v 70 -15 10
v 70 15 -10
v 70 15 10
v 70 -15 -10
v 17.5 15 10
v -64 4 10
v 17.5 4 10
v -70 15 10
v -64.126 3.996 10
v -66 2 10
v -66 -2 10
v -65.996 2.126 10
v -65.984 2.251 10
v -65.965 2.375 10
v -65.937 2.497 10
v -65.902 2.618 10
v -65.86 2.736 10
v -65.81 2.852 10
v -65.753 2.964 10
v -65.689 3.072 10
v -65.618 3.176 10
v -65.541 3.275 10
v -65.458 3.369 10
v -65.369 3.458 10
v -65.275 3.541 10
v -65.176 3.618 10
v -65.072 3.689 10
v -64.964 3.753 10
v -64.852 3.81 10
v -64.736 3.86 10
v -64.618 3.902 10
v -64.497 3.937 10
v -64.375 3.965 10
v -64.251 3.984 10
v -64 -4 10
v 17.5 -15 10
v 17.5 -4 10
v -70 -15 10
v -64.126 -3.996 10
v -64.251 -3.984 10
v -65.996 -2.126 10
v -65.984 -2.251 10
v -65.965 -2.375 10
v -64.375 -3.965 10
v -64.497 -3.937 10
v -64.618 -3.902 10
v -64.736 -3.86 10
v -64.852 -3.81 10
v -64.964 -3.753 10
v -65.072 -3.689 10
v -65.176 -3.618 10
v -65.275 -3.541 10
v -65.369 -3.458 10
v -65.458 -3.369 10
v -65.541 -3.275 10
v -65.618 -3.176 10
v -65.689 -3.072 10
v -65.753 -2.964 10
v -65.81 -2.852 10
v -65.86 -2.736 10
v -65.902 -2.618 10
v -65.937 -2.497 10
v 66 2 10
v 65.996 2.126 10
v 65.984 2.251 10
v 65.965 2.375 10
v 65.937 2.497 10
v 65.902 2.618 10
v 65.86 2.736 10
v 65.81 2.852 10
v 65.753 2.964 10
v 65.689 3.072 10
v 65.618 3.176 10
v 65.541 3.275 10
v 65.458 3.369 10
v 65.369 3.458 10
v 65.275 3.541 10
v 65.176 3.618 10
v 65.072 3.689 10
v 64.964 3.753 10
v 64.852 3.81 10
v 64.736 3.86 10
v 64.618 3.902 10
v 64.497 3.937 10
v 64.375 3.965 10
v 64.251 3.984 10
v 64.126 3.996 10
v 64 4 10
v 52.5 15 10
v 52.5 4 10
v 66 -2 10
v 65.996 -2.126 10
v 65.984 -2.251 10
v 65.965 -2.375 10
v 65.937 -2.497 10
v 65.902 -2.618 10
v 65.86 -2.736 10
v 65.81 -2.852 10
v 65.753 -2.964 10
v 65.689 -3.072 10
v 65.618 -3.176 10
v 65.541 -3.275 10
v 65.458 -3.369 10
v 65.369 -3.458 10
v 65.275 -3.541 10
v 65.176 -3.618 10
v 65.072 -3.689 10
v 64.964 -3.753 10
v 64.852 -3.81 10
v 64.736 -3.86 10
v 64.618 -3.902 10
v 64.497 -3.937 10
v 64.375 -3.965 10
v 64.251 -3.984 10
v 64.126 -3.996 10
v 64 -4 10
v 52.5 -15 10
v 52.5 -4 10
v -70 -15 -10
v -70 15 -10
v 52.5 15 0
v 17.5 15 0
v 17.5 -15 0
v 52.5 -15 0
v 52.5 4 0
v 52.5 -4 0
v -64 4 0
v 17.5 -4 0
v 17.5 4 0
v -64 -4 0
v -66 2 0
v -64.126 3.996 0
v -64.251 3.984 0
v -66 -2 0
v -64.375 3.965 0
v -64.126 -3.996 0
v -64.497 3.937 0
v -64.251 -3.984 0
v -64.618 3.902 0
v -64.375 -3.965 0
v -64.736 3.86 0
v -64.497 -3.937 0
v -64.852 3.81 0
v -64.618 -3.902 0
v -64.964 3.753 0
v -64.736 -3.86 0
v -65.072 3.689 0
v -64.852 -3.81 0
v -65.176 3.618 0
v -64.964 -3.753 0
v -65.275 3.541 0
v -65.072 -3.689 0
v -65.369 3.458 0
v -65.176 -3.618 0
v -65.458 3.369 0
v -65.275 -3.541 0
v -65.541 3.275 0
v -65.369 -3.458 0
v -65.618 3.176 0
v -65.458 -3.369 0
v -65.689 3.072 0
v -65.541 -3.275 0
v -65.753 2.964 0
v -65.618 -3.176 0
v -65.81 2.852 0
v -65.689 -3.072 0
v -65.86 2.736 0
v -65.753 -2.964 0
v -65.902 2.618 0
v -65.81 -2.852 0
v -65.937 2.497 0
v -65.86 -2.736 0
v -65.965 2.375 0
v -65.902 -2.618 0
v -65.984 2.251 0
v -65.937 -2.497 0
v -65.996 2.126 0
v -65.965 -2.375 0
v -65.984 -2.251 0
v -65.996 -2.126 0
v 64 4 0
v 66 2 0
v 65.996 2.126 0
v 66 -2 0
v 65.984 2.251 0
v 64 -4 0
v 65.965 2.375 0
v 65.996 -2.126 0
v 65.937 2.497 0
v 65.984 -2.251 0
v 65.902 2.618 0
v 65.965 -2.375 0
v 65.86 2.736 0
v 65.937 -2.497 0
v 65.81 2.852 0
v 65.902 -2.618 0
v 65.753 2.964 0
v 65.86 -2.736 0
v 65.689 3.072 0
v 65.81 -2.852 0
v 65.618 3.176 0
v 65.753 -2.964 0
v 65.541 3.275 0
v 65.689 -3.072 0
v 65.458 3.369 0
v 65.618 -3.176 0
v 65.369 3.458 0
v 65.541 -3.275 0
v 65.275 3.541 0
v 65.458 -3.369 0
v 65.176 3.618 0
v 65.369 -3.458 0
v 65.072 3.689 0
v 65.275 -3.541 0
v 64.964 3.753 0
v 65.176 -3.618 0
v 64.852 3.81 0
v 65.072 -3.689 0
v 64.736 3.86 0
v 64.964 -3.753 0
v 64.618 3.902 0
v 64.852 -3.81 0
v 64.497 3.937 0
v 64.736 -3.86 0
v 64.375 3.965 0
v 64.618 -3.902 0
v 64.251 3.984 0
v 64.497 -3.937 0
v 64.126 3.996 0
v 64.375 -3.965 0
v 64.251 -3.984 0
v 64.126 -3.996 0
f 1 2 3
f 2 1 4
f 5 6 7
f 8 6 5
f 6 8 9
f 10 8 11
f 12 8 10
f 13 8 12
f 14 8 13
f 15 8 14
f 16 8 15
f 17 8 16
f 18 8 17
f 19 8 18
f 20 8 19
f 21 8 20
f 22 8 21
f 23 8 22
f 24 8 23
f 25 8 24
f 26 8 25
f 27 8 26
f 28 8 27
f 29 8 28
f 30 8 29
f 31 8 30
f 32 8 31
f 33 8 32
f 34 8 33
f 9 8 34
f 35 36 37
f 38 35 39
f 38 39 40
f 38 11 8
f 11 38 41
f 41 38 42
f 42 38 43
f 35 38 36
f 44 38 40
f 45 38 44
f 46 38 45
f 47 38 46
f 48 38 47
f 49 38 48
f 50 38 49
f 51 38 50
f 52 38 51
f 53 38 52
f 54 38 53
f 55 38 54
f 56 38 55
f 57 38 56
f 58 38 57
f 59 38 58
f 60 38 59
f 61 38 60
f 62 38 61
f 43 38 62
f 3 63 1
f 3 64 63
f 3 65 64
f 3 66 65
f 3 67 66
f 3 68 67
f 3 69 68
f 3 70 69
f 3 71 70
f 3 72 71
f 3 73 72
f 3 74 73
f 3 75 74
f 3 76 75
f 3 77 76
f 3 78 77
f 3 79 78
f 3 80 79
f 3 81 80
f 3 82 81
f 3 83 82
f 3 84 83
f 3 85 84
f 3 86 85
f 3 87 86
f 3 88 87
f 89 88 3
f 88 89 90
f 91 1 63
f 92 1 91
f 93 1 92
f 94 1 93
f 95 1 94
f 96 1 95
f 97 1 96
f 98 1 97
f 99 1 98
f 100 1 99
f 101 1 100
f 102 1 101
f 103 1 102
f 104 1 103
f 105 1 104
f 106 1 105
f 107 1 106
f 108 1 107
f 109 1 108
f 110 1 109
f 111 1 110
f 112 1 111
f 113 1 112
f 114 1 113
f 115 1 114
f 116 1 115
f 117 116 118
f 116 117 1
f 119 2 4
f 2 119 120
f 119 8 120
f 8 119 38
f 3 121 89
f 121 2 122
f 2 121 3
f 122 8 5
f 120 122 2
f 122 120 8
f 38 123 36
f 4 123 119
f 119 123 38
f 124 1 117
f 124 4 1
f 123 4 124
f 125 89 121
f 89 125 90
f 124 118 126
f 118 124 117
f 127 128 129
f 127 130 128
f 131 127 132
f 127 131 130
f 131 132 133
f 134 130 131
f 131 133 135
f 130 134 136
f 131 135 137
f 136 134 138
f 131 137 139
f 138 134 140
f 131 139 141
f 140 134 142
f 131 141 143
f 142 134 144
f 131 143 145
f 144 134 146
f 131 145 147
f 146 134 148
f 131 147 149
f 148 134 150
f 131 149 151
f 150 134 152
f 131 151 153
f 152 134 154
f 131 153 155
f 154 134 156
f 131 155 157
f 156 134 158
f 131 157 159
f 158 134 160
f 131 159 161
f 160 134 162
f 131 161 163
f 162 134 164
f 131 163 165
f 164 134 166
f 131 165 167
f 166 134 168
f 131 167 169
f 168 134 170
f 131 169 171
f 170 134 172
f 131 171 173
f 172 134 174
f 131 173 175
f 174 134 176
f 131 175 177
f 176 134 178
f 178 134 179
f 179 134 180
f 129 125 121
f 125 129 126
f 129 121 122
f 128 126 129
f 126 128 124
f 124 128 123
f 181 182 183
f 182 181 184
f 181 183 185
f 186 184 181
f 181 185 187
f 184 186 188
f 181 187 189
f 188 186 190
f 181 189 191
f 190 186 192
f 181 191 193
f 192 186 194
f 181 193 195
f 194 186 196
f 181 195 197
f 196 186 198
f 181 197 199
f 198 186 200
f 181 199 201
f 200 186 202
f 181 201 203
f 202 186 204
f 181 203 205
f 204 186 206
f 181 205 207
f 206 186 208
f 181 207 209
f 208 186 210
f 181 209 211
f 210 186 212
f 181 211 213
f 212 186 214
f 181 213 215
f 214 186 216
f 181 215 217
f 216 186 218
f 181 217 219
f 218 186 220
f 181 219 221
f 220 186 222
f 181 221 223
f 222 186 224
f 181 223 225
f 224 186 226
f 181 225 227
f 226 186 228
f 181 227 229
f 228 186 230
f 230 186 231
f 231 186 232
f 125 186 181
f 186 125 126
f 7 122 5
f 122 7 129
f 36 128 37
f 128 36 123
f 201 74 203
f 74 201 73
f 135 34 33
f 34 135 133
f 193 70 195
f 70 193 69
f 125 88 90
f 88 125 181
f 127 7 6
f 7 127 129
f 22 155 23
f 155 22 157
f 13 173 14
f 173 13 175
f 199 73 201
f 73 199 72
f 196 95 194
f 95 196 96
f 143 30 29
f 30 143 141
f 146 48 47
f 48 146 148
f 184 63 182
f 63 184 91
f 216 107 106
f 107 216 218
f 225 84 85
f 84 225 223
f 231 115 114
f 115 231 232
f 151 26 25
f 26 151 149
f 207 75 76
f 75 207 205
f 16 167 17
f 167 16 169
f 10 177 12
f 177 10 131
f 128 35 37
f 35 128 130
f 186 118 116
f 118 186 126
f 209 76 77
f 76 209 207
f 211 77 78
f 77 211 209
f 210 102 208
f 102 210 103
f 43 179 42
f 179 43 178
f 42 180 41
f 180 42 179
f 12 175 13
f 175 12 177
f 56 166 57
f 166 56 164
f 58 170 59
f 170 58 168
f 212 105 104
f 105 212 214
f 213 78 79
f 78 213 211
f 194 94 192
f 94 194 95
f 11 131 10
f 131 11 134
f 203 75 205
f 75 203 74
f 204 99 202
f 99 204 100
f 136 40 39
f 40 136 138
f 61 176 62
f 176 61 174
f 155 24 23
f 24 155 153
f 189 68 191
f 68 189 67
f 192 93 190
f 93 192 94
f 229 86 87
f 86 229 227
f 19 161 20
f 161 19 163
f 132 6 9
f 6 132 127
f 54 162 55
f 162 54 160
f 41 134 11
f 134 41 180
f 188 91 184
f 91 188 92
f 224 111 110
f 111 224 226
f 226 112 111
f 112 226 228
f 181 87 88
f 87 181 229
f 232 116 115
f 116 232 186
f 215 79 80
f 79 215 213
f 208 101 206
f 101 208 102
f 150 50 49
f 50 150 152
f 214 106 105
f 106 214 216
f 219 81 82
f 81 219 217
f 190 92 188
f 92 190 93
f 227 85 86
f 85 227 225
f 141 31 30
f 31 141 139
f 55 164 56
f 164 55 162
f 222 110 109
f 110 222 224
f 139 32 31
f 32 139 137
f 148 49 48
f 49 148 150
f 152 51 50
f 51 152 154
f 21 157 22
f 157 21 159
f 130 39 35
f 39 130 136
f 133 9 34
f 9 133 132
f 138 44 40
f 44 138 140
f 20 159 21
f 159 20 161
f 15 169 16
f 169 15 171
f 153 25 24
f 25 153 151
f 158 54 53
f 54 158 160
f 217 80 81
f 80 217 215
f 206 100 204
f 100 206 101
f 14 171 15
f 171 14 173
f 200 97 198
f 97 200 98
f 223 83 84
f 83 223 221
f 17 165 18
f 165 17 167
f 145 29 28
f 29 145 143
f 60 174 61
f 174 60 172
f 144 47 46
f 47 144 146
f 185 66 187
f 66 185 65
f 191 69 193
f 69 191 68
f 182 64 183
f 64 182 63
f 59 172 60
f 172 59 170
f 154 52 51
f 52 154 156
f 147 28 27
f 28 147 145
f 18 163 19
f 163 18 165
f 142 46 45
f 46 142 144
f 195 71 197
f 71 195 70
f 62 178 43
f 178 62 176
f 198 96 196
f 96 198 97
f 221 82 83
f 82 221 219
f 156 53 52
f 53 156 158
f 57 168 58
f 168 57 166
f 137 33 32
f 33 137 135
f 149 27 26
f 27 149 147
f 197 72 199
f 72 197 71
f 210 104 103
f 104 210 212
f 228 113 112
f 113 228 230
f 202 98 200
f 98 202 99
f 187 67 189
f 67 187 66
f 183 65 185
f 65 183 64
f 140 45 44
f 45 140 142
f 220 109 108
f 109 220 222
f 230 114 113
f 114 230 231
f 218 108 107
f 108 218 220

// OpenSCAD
/**
 * MIT License
 *
 * Copyright (c) 2026 Adam Kuczyński
 *
 * Permission is hereby granted, free of charge, to any person obtaining a copy
 * of this software and associated documentation files (the "Software"), to deal
 * in the Software without restriction, including without limitation the rights
 * to use, copy, modify, merge, publish, distribute, sublicense, and/or sell
 * copies of the Software, and to permit persons to whom the Software is
 * furnished to do so, subject to the following conditions:
 *
 * The above copyright notice and this permission notice shall be included in all
 * copies or substantial portions of the Software.
 *
 * THE SOFTWARE IS PROVIDED "AS IS", WITHOUT WARRANTY OF ANY KIND, EXPRESS OR
 * IMPLIED, INCLUDING BUT NOT LIMITED TO THE WARRANTIES OF MERCHANTABILITY,
 * FITNESS FOR A PARTICULAR PURPOSE AND NONINFRINGEMENT. IN NO EVENT SHALL THE
 * AUTHORS OR COPYRIGHT HOLDERS BE LIABLE FOR ANY CLAIM, DAMAGES OR OTHER
 * LIABILITY, WHETHER IN AN ACTION OF CONTRACT, TORT OR OTHERWISE, ARISING FROM,
 * OUT OF OR IN CONNECTION WITH THE SOFTWARE OR THE USE OR OTHER DEALINGS IN THE
 * SOFTWARE.
 */

difference() {
    cube([140, 30, 20], center = true);
    translate([35, 0, 5])
        cube([35, 30, 10], center = true);
    translate([0, 0, 5])
        minkowski($fn = 100) {
            cube([128, 4, 6], center = true);
            cylinder(d = 4, h = 4, center = true);
        }
}
